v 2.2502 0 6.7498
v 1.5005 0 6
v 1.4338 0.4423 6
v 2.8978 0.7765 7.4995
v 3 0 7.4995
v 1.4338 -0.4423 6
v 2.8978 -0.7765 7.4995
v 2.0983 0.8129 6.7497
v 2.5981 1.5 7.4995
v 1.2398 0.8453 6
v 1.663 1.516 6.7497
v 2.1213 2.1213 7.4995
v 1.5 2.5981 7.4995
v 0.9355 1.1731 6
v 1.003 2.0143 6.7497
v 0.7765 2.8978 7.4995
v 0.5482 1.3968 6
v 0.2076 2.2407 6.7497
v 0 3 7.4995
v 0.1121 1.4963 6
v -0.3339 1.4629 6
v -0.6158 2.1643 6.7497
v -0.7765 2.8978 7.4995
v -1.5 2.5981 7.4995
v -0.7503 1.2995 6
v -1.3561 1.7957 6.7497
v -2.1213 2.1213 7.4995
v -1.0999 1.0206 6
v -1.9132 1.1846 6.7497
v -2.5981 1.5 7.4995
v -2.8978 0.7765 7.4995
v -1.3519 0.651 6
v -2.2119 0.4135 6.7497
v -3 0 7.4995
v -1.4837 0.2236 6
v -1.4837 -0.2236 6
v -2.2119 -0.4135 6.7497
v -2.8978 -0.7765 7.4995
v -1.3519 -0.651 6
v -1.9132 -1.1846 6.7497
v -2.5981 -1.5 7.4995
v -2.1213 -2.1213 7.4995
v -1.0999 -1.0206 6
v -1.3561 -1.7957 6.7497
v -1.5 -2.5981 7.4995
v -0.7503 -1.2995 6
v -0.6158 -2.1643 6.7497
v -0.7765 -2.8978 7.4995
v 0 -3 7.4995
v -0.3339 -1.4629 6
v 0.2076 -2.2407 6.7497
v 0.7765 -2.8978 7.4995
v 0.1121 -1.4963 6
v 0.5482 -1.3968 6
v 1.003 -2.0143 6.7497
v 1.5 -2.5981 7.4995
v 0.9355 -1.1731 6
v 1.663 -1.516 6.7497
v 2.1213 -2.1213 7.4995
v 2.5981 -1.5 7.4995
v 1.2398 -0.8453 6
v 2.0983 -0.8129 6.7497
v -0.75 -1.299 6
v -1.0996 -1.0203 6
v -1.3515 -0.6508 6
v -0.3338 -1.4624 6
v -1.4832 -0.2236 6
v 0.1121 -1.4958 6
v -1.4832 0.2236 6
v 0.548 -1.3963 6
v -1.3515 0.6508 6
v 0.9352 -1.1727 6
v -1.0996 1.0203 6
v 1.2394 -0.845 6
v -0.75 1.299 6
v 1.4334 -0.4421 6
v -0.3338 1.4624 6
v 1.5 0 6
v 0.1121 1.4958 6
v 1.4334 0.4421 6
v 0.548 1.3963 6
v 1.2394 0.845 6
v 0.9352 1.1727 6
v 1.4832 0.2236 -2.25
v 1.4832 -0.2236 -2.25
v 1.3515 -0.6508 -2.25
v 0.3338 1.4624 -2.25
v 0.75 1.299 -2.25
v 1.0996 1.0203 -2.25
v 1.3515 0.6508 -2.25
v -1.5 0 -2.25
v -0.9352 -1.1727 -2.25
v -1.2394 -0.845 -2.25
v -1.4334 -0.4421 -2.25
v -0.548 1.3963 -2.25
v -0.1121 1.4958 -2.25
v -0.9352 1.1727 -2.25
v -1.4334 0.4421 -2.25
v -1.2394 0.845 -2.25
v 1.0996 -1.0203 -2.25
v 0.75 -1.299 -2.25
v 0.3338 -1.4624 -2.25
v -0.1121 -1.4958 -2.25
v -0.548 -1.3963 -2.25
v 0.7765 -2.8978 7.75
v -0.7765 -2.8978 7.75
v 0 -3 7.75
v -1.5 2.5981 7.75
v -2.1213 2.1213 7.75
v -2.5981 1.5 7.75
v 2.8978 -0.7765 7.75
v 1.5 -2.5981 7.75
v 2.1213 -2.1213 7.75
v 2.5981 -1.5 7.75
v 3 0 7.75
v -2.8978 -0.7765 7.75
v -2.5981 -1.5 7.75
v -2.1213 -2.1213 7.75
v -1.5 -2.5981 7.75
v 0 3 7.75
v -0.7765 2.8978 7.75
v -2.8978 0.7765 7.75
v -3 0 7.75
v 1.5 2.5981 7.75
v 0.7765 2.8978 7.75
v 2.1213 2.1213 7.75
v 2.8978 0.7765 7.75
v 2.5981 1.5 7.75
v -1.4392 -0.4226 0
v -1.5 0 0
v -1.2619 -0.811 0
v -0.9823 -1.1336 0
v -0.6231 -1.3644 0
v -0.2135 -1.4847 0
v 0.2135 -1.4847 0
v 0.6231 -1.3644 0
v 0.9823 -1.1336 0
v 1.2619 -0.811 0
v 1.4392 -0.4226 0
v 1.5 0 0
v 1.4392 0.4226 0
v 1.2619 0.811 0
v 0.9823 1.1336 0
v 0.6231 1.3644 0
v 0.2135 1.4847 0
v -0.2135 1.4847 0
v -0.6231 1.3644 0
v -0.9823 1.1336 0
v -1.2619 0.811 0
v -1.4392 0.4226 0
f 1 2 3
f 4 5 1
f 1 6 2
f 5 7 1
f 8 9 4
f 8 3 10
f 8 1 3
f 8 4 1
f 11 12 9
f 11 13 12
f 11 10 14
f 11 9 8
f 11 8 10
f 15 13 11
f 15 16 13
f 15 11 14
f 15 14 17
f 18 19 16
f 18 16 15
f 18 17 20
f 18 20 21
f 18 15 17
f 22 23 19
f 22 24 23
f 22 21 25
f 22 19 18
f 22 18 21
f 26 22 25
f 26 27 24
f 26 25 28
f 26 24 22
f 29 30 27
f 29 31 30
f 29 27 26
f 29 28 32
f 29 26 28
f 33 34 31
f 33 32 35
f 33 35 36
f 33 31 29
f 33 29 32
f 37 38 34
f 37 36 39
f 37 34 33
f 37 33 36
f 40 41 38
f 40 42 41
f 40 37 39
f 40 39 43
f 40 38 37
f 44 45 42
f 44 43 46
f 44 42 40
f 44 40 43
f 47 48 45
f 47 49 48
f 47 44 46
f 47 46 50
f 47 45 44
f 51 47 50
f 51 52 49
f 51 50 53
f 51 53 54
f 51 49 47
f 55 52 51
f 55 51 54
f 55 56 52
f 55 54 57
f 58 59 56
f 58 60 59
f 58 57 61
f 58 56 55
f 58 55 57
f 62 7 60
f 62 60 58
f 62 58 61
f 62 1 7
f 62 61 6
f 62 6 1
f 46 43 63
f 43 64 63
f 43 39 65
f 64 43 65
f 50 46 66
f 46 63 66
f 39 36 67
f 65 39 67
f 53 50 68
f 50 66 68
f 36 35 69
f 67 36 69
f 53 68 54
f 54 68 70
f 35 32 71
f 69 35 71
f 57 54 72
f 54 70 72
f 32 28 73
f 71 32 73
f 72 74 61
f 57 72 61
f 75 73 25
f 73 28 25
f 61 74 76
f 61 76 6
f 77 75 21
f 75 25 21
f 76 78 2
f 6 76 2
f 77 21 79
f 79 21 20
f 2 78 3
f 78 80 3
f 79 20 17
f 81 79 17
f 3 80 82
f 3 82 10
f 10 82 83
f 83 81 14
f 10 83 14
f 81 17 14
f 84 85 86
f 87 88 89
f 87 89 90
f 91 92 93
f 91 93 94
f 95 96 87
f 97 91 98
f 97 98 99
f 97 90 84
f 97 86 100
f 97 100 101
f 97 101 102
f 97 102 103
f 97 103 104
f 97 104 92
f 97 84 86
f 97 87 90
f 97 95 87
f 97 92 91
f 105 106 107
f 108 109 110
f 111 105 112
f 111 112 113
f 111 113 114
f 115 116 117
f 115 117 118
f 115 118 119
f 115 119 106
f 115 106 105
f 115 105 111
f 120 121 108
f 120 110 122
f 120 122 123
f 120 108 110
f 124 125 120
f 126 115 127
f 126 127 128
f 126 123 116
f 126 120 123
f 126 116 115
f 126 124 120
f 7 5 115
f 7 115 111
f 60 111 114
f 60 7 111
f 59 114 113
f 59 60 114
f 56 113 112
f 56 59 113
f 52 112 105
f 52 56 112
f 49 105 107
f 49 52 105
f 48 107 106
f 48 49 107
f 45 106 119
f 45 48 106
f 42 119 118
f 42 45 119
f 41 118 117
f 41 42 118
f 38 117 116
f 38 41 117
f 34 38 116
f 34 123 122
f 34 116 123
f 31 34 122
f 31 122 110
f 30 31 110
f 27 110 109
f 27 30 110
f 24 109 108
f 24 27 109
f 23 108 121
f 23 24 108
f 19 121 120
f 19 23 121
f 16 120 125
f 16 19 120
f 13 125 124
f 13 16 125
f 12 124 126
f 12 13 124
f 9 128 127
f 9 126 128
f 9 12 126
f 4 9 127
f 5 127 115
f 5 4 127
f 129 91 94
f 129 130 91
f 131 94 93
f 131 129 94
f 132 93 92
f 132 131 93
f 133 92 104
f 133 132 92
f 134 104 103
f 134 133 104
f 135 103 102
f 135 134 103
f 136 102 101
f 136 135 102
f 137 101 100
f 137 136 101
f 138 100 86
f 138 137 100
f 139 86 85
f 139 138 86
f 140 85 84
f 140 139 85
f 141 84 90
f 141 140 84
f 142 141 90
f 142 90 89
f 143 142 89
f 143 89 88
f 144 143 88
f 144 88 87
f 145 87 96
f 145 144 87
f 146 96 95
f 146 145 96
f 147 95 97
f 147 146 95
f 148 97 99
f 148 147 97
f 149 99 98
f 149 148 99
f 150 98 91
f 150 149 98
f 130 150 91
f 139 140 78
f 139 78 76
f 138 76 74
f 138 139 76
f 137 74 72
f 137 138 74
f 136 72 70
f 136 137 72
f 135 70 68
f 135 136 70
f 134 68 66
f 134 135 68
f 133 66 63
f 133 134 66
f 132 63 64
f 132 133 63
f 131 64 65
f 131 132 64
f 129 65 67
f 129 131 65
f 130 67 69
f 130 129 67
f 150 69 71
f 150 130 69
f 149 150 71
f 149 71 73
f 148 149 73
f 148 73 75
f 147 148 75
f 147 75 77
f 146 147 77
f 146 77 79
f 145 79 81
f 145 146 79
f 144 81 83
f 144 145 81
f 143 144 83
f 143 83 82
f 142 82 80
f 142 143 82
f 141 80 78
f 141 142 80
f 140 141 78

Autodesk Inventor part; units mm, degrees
ref_plane "YZ Plane" through (0, 0, 0) normal (1, 0, 0) x (0, 1, 0)
ref_plane "XZ Plane" through (0, 0, 0) normal (0, 1, 0) x (-1, 0, 0)
ref_plane "XY Plane" through (0, 0, 0) normal (0, 0, 1) x (1, 0, 0)
sketch "スケッチ1" plane through (0, 0, 0) normal (0, 0, 1) x (1, 0, 0)
  circle A0 centre (0, 0) radius 1.5
  dimension "d0" = 3
extrude "押し出し1" add sketch "スケッチ1" along normal blind 6
sketch "スケッチ2" plane through (0, 0, 6) normal (0, 0, 1) x (1, 0, 0)
  circle A0 centre (0, 0) radius 1.5 projected
  circle A1 centre (0, 0) radius 3
  dimension "d3" = 6
extrude "押し出し2" add sketch "スケッチ2" along normal blind 1.75 contours A0 | A1
thread "ねじ1" size "M3x0.5" class "6g" standard "ANSI Metric M Profile" full length
chamfer "面取り1" distance 1.5 angle 45 1 edges at (-3, 0, 6)
sketch "スケッチ4" plane through (0, 0, 0) normal (0, 0, -1) x (-1, 0, 0)
  circle A0 centre (0, 0) radius 1.5 projected
extrude "押し出し4" add sketch "スケッチ4" along normal blind 4
sketch "スケッチ5" plane through (0, 0, -4) normal (0, 0, -1) x (-1, 0, 0)
  circle A0 centre (0, 0) radius 1.5 projected
extrude "押し出し5" cut sketch "スケッチ5" against normal blind 1.75
properties part number "SB　10mm皿ネジ" material "Steel, Mild"
